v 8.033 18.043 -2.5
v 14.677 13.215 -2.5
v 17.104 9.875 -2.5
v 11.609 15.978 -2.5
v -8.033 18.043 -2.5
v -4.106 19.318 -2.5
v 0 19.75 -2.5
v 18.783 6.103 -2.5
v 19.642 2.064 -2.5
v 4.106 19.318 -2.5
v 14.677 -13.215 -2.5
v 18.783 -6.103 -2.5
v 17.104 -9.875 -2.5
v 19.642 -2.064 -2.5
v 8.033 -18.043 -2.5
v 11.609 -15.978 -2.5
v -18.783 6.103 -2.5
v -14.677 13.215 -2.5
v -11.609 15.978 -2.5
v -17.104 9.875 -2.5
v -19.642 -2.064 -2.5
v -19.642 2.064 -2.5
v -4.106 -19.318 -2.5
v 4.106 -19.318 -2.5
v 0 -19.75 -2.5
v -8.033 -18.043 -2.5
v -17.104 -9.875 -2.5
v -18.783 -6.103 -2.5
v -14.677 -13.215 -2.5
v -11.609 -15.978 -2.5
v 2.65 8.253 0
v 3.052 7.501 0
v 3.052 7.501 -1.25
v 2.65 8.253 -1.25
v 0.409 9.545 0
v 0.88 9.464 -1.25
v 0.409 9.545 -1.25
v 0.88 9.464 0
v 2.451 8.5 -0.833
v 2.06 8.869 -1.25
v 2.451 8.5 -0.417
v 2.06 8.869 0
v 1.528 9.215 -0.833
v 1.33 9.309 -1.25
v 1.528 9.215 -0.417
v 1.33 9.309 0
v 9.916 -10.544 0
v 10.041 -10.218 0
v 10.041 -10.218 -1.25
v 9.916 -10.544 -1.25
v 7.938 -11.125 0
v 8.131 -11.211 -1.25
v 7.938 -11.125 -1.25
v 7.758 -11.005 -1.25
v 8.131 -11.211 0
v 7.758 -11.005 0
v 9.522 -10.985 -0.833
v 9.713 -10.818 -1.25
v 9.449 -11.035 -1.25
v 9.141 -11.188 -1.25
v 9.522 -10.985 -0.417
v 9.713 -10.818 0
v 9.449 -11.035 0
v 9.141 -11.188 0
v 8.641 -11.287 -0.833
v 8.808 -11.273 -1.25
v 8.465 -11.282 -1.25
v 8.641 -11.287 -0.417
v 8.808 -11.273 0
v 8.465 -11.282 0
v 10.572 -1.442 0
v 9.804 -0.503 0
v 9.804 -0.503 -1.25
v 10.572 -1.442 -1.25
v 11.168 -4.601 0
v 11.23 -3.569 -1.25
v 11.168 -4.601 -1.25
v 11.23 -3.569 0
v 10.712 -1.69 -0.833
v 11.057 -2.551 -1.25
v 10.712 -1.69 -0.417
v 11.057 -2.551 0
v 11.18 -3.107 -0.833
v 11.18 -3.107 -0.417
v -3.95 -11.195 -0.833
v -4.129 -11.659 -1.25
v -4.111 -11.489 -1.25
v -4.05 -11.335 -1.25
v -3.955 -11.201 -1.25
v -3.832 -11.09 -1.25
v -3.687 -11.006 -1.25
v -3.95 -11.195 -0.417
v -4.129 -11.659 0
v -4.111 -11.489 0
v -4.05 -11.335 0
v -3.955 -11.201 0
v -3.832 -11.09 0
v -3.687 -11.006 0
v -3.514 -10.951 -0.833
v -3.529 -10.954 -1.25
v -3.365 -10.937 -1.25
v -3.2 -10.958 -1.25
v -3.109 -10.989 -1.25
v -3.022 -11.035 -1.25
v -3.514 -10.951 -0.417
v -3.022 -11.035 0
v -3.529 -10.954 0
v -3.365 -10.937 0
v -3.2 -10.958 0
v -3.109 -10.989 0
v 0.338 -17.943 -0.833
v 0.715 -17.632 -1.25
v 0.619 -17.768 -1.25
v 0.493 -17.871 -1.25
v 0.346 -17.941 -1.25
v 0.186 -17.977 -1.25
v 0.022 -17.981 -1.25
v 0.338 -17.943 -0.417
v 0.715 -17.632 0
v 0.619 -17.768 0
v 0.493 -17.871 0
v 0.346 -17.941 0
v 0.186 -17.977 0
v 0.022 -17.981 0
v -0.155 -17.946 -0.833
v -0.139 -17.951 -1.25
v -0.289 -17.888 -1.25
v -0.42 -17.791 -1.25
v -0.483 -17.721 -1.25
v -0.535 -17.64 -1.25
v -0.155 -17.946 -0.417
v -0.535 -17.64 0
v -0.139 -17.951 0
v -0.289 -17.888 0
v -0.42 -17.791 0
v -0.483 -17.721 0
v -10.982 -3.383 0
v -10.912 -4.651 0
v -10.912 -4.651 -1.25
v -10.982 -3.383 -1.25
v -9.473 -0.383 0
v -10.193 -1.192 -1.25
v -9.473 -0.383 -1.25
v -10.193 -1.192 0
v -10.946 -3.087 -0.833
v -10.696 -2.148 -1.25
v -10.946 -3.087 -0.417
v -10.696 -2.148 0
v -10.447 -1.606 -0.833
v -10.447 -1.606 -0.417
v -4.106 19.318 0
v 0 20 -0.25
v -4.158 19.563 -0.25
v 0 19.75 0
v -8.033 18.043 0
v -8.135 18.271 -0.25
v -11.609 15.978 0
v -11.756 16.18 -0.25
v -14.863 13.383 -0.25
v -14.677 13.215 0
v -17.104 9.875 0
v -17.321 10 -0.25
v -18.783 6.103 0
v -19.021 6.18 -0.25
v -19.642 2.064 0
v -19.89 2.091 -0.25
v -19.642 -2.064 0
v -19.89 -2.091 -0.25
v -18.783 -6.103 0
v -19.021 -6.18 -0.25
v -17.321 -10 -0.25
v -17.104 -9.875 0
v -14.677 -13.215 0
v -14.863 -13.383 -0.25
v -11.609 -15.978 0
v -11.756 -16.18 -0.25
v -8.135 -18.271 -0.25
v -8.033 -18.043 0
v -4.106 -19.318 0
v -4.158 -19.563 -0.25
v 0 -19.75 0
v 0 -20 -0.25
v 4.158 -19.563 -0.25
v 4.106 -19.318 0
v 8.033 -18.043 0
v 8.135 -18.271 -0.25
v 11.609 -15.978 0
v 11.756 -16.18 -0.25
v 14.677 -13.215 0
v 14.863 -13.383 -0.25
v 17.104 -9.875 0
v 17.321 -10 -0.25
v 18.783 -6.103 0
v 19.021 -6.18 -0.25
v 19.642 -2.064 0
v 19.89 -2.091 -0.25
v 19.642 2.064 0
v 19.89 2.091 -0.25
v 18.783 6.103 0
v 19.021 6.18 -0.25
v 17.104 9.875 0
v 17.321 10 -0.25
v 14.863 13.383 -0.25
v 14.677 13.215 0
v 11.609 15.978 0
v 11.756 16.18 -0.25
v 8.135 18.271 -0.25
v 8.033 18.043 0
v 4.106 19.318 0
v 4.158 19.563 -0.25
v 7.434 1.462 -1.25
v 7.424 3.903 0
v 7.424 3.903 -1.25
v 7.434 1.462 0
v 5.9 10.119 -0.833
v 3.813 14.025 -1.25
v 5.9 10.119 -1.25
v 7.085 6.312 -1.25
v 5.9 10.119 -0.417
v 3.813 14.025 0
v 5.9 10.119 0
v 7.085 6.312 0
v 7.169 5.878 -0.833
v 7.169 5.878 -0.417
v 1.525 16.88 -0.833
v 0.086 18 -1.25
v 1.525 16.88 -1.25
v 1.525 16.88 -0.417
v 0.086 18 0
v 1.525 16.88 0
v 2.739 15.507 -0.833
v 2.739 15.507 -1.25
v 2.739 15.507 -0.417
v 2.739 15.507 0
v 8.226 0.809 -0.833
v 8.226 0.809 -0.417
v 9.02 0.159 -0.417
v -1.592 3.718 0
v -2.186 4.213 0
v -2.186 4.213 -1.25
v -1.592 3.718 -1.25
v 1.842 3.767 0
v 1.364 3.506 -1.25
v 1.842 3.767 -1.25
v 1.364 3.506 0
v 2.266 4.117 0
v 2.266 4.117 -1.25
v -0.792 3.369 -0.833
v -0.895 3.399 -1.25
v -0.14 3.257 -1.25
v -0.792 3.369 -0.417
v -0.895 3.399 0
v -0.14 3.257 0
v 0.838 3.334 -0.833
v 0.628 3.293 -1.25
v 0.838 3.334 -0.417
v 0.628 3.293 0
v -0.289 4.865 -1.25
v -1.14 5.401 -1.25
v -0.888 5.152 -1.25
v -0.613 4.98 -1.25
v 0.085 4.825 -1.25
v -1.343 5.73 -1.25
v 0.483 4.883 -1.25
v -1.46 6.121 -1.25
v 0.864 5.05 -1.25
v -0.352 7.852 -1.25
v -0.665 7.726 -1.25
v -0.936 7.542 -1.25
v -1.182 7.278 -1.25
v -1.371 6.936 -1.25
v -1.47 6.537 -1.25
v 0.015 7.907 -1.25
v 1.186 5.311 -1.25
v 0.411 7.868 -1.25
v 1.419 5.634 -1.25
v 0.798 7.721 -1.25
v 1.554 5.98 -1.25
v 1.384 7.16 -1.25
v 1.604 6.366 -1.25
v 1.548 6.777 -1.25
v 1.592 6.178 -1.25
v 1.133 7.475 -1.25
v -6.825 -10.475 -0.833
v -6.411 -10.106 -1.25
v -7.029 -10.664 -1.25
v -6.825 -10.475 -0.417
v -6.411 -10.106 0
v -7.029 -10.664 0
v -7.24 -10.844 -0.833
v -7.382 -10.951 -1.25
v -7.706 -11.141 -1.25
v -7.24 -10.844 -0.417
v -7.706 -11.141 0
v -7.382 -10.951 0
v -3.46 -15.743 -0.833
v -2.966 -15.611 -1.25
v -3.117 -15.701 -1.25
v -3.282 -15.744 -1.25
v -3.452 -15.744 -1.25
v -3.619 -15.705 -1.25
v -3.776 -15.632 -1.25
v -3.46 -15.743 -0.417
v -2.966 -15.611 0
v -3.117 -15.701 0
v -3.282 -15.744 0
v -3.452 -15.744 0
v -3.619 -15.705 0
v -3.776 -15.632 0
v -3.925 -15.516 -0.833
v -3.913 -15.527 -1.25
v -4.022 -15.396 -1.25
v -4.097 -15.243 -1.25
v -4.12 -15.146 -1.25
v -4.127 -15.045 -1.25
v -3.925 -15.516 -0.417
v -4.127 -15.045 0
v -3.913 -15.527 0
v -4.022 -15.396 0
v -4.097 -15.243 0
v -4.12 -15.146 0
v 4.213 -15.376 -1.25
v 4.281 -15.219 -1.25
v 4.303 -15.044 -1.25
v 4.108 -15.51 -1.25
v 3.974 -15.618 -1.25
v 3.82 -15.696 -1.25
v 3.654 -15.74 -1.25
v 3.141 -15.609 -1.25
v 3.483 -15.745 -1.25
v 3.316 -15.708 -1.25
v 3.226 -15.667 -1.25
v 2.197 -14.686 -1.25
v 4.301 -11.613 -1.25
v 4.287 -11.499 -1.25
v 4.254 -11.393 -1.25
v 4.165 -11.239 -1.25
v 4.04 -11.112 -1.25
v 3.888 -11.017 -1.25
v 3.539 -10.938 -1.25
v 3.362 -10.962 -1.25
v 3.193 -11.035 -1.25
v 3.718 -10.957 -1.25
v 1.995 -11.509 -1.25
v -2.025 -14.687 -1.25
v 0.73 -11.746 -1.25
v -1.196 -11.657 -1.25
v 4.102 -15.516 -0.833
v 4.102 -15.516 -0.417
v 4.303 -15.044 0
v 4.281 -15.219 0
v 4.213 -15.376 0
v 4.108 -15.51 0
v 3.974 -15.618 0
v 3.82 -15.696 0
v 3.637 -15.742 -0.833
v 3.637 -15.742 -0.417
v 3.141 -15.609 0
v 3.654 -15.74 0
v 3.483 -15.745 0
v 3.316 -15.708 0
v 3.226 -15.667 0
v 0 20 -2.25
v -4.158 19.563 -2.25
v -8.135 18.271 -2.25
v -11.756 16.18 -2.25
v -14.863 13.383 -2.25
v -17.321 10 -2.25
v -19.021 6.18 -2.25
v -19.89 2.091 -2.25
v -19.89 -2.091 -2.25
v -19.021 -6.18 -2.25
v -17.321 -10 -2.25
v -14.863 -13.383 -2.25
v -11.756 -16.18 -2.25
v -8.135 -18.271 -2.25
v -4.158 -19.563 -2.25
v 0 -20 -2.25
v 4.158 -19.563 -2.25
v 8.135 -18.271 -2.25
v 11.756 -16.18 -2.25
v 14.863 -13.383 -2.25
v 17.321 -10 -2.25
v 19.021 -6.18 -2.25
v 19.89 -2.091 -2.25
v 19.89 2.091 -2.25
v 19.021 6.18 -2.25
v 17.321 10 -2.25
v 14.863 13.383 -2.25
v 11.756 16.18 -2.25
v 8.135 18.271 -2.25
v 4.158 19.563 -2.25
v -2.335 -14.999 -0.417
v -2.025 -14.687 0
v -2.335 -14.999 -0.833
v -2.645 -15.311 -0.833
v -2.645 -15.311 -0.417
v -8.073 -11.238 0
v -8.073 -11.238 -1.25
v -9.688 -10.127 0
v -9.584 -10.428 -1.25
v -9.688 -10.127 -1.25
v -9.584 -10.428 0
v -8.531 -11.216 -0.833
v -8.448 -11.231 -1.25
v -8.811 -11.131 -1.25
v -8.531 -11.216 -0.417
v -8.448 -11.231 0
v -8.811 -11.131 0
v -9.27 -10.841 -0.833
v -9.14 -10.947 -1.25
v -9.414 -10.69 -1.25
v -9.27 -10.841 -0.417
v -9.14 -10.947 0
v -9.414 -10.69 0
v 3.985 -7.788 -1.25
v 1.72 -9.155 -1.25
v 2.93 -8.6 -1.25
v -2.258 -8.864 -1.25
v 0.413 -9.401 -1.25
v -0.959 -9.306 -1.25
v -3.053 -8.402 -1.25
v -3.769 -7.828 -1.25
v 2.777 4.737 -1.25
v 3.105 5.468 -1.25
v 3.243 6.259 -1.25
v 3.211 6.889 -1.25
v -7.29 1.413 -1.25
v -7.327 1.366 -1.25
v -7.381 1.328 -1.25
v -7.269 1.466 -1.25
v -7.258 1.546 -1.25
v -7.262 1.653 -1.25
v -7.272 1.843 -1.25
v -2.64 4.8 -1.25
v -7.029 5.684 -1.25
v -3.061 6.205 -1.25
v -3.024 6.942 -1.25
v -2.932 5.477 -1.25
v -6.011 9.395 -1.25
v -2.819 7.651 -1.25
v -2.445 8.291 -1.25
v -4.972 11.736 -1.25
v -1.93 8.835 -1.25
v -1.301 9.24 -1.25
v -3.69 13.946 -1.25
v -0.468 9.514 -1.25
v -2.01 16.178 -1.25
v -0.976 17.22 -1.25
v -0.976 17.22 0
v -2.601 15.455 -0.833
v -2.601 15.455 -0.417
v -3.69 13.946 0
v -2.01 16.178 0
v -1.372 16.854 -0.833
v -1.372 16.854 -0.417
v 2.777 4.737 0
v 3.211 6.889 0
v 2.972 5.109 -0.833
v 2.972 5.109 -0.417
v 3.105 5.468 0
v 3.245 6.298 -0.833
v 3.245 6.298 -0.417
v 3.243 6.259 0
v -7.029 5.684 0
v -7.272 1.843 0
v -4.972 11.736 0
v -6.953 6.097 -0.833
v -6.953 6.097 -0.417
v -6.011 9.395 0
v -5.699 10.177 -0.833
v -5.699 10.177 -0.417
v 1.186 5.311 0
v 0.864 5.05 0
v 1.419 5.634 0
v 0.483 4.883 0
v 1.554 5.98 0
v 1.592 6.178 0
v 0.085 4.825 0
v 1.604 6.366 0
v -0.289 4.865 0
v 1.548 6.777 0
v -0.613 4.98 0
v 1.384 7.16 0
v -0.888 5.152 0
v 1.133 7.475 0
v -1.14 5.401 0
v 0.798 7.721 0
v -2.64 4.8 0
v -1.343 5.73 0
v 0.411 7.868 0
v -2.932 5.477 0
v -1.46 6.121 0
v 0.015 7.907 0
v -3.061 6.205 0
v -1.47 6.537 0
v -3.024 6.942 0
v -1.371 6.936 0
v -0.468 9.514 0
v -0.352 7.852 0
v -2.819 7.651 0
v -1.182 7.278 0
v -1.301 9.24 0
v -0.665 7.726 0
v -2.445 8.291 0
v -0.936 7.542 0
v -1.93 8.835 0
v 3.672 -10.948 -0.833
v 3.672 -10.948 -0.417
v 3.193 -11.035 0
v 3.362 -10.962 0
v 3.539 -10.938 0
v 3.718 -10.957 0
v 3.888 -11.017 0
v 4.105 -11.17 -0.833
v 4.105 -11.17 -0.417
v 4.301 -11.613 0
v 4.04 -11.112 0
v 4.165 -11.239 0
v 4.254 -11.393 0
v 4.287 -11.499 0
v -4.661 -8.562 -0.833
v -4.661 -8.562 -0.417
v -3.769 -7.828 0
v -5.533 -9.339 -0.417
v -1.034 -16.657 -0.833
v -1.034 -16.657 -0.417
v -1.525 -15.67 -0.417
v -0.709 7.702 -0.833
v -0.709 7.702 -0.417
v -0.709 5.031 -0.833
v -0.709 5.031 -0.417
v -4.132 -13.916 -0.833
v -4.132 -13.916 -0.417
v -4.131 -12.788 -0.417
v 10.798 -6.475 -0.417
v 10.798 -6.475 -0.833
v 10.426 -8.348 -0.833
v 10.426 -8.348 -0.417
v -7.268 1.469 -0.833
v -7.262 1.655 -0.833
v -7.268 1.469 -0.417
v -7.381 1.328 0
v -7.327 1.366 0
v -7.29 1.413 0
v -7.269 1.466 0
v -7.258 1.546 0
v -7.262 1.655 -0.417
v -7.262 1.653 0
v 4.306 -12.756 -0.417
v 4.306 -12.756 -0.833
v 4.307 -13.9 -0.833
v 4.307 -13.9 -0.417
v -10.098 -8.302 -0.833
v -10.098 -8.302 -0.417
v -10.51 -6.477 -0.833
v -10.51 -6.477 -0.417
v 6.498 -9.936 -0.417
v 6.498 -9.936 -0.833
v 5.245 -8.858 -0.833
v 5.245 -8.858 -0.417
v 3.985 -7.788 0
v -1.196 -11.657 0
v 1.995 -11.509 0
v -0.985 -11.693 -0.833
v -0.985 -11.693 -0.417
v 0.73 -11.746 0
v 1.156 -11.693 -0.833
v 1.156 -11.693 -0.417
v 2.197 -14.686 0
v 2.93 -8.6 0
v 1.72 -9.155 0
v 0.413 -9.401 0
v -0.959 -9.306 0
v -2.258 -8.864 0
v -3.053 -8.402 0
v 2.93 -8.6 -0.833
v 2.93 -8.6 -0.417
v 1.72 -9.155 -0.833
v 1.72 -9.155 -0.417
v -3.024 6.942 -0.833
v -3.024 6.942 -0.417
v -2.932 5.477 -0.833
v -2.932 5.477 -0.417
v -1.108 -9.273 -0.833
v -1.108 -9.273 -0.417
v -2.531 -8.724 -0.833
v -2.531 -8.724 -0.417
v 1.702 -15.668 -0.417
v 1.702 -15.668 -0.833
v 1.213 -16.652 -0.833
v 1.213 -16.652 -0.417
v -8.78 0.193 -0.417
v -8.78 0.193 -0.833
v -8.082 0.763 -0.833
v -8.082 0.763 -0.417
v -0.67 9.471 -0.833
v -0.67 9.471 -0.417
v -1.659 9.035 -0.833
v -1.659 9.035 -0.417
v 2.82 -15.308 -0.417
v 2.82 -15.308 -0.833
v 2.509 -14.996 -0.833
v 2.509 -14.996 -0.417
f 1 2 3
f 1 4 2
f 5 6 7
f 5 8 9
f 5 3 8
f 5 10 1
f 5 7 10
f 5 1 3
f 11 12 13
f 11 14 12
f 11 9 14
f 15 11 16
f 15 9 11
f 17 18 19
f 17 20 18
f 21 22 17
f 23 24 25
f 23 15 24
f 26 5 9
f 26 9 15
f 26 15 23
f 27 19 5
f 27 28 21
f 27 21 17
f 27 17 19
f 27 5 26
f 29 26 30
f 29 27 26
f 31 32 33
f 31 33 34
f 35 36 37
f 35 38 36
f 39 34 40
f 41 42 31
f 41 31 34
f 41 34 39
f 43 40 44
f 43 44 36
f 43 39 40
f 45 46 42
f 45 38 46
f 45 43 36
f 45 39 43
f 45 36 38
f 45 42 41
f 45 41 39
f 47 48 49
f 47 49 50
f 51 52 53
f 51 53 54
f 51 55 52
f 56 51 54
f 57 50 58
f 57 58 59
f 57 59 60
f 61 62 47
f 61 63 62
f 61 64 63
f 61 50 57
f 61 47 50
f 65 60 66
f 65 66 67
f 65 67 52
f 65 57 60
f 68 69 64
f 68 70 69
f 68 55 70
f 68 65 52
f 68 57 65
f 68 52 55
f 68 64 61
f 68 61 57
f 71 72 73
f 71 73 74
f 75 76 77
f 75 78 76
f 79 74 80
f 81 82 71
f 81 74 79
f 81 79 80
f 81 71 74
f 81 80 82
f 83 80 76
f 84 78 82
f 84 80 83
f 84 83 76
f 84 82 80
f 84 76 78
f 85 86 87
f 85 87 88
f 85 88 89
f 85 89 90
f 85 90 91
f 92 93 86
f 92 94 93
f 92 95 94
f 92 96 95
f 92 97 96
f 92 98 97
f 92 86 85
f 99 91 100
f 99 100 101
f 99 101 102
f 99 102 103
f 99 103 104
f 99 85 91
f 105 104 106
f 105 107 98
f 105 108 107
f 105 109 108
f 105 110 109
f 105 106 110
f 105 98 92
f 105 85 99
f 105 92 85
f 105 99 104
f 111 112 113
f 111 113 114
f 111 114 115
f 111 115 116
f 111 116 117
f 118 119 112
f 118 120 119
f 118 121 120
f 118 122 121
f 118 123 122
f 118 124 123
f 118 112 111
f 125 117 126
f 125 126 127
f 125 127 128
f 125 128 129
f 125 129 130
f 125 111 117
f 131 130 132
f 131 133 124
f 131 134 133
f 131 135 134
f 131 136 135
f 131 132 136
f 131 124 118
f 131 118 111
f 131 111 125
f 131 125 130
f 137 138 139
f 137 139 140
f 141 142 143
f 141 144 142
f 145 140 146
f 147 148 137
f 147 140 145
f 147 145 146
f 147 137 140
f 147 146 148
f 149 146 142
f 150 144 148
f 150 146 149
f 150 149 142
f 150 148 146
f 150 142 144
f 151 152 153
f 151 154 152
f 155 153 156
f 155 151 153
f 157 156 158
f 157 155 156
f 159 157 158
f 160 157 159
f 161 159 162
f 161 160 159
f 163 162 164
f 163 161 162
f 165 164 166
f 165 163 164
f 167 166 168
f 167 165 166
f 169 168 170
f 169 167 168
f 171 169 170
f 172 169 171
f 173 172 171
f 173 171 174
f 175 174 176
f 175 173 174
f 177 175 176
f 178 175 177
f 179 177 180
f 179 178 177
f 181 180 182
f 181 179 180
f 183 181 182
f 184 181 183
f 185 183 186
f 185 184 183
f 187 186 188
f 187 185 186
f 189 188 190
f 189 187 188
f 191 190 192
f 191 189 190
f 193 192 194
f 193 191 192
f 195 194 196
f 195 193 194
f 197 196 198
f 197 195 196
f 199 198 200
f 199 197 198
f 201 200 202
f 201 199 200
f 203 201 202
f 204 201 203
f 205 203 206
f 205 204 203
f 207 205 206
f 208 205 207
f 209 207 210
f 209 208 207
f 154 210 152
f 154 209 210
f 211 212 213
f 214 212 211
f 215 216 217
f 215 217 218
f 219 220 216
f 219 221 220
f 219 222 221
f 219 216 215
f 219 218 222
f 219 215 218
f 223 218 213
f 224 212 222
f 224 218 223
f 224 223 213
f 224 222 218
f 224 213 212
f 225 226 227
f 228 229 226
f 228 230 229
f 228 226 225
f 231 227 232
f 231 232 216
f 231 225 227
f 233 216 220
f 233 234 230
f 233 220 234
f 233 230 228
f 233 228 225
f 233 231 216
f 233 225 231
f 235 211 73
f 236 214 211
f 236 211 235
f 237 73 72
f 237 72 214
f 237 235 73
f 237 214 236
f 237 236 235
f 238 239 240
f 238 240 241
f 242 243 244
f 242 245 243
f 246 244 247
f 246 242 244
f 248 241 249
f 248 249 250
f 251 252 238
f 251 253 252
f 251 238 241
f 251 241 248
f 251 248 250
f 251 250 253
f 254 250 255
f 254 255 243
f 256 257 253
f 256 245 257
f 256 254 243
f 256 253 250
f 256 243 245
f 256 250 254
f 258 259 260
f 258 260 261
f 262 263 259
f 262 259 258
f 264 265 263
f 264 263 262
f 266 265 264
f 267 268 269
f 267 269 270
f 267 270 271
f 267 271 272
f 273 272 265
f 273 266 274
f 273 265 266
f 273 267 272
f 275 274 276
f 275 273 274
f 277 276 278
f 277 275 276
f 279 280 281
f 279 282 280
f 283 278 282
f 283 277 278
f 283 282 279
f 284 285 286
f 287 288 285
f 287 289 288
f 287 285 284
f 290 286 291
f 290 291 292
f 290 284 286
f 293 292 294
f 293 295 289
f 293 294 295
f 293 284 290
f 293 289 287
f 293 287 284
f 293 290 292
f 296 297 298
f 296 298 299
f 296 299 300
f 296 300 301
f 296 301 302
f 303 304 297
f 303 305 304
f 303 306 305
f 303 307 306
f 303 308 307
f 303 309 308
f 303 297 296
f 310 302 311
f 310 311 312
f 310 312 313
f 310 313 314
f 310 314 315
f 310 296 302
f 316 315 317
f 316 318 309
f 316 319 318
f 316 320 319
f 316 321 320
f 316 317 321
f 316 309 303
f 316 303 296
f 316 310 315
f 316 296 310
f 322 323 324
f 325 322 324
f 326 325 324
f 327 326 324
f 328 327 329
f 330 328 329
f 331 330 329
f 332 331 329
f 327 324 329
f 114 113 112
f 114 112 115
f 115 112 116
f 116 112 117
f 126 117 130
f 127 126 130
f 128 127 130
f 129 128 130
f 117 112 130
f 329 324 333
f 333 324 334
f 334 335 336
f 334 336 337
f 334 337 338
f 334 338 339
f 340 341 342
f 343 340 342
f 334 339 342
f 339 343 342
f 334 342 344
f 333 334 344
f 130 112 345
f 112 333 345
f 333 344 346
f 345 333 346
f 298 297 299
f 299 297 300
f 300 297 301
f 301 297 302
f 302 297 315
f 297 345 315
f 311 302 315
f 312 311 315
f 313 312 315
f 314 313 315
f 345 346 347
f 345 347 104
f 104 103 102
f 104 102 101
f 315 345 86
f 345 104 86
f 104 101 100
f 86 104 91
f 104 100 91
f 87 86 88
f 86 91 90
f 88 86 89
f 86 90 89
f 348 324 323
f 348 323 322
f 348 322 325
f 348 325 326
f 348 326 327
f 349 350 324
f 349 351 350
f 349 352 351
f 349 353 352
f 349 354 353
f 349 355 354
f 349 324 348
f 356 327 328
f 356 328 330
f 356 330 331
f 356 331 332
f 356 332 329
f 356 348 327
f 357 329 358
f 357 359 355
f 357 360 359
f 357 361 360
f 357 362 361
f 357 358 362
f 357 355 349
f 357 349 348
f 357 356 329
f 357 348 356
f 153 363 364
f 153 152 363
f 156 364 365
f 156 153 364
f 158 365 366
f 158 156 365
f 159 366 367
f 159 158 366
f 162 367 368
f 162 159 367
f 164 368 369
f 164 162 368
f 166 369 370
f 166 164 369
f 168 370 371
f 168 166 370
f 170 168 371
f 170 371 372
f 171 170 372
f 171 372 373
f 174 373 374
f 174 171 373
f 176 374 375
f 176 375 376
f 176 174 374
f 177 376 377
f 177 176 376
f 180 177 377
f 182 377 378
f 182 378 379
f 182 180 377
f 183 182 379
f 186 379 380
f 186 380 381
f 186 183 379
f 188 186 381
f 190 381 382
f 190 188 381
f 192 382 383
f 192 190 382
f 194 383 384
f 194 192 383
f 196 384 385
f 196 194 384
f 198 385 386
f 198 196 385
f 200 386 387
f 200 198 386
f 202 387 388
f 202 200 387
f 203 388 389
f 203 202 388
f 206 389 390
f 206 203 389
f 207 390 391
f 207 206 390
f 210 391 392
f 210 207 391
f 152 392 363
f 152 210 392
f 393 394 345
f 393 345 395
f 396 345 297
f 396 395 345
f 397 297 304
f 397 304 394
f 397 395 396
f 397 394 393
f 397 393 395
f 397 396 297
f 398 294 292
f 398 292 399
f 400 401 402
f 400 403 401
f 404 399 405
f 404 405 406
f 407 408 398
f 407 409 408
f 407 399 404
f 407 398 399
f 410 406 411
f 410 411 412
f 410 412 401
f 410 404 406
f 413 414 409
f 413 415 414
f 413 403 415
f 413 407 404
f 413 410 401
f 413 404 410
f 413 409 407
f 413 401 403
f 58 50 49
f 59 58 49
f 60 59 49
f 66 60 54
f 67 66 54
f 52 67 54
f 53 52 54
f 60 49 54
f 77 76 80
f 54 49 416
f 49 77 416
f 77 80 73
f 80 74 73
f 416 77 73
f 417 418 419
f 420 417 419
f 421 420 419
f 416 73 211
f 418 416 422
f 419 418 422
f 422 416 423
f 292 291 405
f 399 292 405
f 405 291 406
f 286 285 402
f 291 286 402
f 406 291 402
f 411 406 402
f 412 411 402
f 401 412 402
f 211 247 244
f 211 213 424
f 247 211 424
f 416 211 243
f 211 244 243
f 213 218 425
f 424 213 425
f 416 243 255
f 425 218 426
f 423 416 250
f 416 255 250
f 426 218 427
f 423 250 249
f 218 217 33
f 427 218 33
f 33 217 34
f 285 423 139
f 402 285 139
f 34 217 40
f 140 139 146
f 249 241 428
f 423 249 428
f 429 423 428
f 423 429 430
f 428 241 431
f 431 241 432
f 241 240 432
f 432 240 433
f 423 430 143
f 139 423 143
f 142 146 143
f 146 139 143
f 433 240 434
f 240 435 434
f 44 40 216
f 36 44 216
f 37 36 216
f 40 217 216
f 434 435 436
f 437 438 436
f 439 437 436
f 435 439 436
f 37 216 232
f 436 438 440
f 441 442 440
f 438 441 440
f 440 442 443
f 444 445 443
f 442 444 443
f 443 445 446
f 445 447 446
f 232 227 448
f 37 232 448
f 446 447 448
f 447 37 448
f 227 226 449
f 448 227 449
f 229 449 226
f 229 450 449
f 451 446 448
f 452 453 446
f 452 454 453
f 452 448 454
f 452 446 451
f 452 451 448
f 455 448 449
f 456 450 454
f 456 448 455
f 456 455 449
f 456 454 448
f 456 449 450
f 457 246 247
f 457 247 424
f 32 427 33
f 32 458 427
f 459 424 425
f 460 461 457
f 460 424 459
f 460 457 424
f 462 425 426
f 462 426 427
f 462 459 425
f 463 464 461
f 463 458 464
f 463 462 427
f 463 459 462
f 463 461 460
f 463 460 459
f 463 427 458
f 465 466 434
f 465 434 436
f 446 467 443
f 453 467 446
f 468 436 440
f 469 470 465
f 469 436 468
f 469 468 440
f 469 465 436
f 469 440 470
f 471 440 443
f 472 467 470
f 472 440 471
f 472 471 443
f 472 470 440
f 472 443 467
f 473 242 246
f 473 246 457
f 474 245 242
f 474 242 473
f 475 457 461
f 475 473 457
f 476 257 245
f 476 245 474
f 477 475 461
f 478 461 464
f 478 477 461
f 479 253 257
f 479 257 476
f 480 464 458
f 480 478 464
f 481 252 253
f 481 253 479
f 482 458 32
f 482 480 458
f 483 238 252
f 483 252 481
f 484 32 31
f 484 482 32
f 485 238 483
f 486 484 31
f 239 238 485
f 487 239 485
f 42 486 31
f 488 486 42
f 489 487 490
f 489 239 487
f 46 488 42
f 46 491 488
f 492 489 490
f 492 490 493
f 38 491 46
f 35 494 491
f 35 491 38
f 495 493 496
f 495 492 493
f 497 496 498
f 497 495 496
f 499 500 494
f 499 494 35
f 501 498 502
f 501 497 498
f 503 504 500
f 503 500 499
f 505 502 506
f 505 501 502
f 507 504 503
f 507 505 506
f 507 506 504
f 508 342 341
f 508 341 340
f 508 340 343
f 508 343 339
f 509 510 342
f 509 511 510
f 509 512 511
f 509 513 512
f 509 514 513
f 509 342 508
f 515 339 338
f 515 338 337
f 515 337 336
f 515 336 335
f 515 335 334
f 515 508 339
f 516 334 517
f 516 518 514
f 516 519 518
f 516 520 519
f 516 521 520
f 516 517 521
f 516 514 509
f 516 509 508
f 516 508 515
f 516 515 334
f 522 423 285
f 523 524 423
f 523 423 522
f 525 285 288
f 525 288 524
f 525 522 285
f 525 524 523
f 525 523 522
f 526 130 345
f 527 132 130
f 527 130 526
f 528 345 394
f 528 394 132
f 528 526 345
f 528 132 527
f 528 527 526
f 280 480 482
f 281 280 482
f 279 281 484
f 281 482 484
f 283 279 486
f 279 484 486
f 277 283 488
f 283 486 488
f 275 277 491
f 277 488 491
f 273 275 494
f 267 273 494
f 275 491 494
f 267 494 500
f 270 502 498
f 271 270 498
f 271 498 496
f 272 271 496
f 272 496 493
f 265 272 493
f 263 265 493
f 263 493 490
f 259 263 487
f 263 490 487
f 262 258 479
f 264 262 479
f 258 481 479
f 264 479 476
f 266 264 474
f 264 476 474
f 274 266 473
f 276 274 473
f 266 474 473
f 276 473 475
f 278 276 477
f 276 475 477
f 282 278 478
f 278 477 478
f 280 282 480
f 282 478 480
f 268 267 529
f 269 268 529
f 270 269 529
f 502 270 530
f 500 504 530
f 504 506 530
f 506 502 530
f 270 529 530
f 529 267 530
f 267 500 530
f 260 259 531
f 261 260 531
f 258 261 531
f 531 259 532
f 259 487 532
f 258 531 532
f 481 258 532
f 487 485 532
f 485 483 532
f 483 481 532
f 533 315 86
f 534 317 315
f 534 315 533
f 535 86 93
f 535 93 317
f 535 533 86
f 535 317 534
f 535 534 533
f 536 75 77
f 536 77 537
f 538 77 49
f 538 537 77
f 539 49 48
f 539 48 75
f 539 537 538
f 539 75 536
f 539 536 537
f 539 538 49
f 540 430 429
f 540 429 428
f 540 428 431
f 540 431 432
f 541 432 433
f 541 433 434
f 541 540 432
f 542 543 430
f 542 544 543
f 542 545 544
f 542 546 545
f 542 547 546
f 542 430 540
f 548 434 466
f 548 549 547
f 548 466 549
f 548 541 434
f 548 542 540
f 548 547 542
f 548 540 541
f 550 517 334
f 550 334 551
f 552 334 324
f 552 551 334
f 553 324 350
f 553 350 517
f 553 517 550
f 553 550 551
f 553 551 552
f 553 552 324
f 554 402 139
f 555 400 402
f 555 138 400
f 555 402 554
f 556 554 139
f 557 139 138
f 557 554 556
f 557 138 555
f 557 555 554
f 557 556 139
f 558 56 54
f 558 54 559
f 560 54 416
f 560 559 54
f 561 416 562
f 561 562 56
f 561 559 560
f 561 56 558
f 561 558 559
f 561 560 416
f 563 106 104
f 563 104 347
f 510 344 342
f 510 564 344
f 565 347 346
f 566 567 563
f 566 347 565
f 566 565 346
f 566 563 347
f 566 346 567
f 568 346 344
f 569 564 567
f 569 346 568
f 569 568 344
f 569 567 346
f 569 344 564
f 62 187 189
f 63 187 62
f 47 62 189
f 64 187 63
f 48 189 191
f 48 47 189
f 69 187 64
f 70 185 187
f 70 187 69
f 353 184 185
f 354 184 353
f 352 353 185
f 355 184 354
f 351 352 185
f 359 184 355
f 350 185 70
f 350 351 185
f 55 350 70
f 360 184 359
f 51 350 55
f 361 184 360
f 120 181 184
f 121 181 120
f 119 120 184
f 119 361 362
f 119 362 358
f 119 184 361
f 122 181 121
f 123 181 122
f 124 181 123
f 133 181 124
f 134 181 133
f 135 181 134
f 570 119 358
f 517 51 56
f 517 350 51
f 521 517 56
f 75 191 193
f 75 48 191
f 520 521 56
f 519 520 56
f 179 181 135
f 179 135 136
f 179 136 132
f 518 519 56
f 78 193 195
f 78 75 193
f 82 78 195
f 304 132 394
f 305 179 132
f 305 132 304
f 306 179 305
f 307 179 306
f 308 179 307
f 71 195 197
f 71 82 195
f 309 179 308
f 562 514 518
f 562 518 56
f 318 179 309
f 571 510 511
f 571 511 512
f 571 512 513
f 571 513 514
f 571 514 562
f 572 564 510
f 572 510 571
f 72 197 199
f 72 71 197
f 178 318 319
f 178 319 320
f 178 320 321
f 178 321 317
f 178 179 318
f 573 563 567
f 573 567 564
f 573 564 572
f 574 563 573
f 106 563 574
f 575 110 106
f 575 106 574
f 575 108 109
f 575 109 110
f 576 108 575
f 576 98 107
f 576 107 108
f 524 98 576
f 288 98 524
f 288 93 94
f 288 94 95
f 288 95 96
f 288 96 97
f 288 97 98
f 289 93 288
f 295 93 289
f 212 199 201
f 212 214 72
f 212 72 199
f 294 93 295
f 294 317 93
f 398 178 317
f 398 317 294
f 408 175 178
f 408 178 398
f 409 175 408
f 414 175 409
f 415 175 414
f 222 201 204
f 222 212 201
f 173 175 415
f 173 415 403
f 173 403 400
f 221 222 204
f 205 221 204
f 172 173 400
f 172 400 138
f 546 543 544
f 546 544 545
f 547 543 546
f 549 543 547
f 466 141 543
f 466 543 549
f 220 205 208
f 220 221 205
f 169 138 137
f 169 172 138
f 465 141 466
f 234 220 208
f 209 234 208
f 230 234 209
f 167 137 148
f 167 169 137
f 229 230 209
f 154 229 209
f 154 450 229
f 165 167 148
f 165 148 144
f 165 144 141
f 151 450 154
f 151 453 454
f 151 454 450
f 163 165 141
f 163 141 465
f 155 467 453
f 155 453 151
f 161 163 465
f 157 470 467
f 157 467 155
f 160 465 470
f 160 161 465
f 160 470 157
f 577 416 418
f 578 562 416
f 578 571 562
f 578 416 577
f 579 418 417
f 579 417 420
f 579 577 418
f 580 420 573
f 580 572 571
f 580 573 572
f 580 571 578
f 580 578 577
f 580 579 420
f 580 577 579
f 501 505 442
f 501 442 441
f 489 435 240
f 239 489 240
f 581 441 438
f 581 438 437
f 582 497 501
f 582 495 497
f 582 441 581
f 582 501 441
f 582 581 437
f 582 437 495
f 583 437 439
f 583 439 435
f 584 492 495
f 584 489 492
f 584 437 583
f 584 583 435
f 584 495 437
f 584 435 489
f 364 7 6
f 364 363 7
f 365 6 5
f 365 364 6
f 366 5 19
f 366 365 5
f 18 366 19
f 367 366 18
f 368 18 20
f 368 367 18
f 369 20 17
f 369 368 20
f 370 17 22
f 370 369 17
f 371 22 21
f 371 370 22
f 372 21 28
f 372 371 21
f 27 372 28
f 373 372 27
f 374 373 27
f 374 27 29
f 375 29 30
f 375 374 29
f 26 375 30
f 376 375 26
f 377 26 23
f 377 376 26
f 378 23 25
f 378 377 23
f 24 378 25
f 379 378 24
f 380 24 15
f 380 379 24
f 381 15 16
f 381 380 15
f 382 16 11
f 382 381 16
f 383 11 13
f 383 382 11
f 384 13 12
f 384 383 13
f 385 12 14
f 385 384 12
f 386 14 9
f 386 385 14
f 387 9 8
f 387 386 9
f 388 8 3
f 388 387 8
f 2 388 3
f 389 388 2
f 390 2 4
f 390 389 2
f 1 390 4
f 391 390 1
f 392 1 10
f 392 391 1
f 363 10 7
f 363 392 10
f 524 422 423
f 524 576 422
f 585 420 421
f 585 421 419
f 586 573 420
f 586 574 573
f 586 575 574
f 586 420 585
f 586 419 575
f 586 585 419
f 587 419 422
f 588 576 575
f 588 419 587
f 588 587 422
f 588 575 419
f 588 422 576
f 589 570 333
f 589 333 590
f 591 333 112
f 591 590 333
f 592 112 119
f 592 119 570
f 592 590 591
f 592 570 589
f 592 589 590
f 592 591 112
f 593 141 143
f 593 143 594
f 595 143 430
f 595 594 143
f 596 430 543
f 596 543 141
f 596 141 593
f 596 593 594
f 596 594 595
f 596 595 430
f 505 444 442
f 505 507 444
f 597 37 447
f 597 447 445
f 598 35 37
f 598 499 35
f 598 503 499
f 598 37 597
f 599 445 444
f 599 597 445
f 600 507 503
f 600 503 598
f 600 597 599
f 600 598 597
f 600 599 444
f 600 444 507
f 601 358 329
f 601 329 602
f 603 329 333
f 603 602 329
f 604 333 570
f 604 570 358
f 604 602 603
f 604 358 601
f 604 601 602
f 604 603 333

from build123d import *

# Parameters (mm, degrees)
POCKET_DEPTH = 1.25


with BuildPart() as part:
    # Sketch (on DatumPlane) → Revolution (revolve)
    with BuildSketch(Plane.YZ):
        Polygon((0, 0), (0, -2.5), (19.75, -2.5), (20, -2.25), (20, -0.25), (19.75, 0), align=None)
    revolve(axis=Axis((0, 0, 0), (0, 0, 1)))

    # Sketch005 → Pocket (cut)
    with BuildSketch(Plane.XY):
        with BuildLine():
            add(Edge.make_bspline(
                [(-3.689668, 13.94616), (-2.641611, 15.462794), (-1.516137, 17.02899), (0.085841, 18)],
                knots=[0, 0, 0, 0, 1, 1, 1, 1], degree=3))
            add(Edge.make_bspline(
                [(0.085841, 18), (1.66552, 17.053067), (2.779956, 15.514726), (3.813048, 14.024985)],
                knots=[0, 0, 0, 0, 1, 1, 1, 1], degree=3))
            add(Edge.make_bspline(
                [(3.813048, 14.024985), (6.246463, 10.339042), (7.734204, 5.911748), (7.434093, 1.462081)],
                knots=[0, 0, 0, 0, 1, 1, 1, 1], degree=3))
            add(Edge.make_bspline(
                [(7.434093, 1.462081), (8.220487, 0.802888), (9.029626, 0.169994), (9.804315, -0.502683)],
                knots=[0, 0, 0, 0, 1, 1, 1, 1], degree=3))
            add(Edge.make_bspline(
                [(9.804315, -0.502683), (10.91638, -1.524811), (11.43563, -3.119232), (11.167893, -4.601492)],
                knots=[0, 0, 0, 0, 1, 1, 1, 1], degree=3))
            add(Edge.make_bspline(
                [(11.167893, -4.601492), (10.794809, -6.473948), (10.436246, -8.350627), (10.041382, -10.217971)],
                knots=[0, 0, 0, 0, 1, 1, 1, 1], degree=3))
            add(Edge.make_bspline(
                [(10.041382, -10.217971), (9.821873, -11.178684), (8.522081, -11.618517), (7.757911, -11.004736)],
                knots=[0, 0, 0, 0, 1, 1, 1, 1], degree=3))
            add(Edge.make_bspline(
                [(7.757911, -11.004736), (6.48953, -9.946011), (5.252709, -8.848319), (3.984699, -7.78826)],
                knots=[0, 0, 0, 0, 1, 1, 1, 1], degree=3))
            add(Edge.make_bspline(
                [(3.984699, -7.78826), (3.02532, -8.711487), (1.750864, -9.327119), (0.412845, -9.401277)],
                knots=[0, 0, 0, 0, 1, 1, 1, 1], degree=3))
            add(Edge.make_bspline(
                [(0.412845, -9.401277), (-1.127422, -9.509883), (-2.652353, -8.871136), (-3.769011, -7.827598)],
                knots=[0, 0, 0, 0, 1, 1, 1, 1], degree=3))
            add(Edge.make_bspline(
                [(-3.769011, -7.827598), (-4.678754, -8.524056), (-5.522267, -9.360086), (-6.411119, -10.106031)],
                knots=[0, 0, 0, 0, 1, 1, 1, 1], degree=3))
            add(Edge.make_bspline(
                [(-6.411119, -10.106031), (-6.840728, -10.45126), (-7.197958, -10.904946), (-7.706392, -11.140679)],
                knots=[0, 0, 0, 0, 1, 1, 1, 1], degree=3))
            add(Edge.make_bspline(
                [(-7.706392, -11.140679), (-8.494639, -11.47887), (-9.509729, -10.97414), (-9.687899, -10.126849)],
                knots=[0, 0, 0, 0, 1, 1, 1, 1], degree=3))
            add(Edge.make_bspline(
                [(-9.687899, -10.126849), (-10.093802, -8.301287), (-10.517855, -6.478985), (-10.911756, -4.650609)],
                knots=[0, 0, 0, 0, 1, 1, 1, 1], degree=3))
            add(Edge.make_bspline(
                [(-10.911756, -4.650609), (-11.23187, -3.103897), (-10.66491, -1.419835), (-9.473131, -0.38289)],
                knots=[0, 0, 0, 0, 1, 1, 1, 1], degree=3))
            add(Edge.make_bspline(
                [(-9.473131, -0.38289), (-8.783193, 0.19659), (-8.083624, 0.764438), (-7.380796, 1.328138)],
                knots=[0, 0, 0, 0, 1, 1, 1, 1], degree=3))
            add(Edge.make_bspline(
                [(-7.380796, 1.328138), (-7.184994, 1.431114), (-7.283376, 1.668625), (-7.272264, 1.843092)],
                knots=[0, 0, 0, 0, 1, 1, 1, 1], degree=3))
            add(Edge.make_bspline(
                [(-7.272264, 1.843092), (-7.481771, 6.136295), (-6.015292, 10.379862), (-3.689668, 13.94616)],
                knots=[0, 0, 0, 0, 1, 1, 1, 1], degree=3))
        make_face()
        with BuildLine():
            add(Edge.make_bspline(
                [(-2.444846, 8.291231), (-3.365257, 7.106342), (-3.25391, 5.271002), (-2.186443, 4.212795)],
                knots=[0, 0, 0, 0, 1, 1, 1, 1], degree=3))
            add(Edge.make_bspline(
                [(-2.186443, 4.212795), (-1.056302, 2.967529), (1.084336, 2.922115), (2.26641, 4.117228)],
                knots=[0, 0, 0, 0, 1, 1, 1, 1], degree=3))
            add(Edge.make_bspline(
                [(2.26641, 4.117228), (3.178894, 4.950888), (3.487451, 6.350544), (3.051916, 7.500688)],
                knots=[0, 0, 0, 0, 1, 1, 1, 1], degree=3))
            add(Edge.make_bspline(
                [(3.051916, 7.500688), (2.652829, 8.609493), (1.584399, 9.441301), (0.409289, 9.544721)],
                knots=[0, 0, 0, 0, 1, 1, 1, 1], degree=3))
            add(Edge.make_bspline(
                [(0.409289, 9.544721), (-0.675884, 9.669626), (-1.799506, 9.170378), (-2.444846, 8.291231)],
                knots=[0, 0, 0, 0, 1, 1, 1, 1], degree=3))
        make_face(mode=Mode.SUBTRACT)
        with BuildLine():
            add(Edge.make_bspline(
                [(-4.128908, -11.658892), (-4.144688, -11.120603), (-3.474752, -10.750482), (-3.021955, -11.035333)],
                knots=[0, 0, 0, 0, 1, 1, 1, 1], degree=3))
            add(Edge.make_bspline(
                [(-3.021955, -11.035333), (-1.105419, -12.022123), (1.276879, -12.021678), (3.193341, -11.034814)],
                knots=[0, 0, 0, 0, 1, 1, 1, 1], degree=3))
            add(Edge.make_bspline(
                [(3.193341, -11.034814), (3.633173, -10.76478), (4.285033, -11.089117), (4.301257, -11.612886)],
                knots=[0, 0, 0, 0, 1, 1, 1, 1], degree=3))
            add(Edge.make_bspline(
                [(4.301257, -11.612886), (4.307702, -12.75614), (4.309036, -13.90058), (4.303035, -15.044204)],
                knots=[0, 0, 0, 0, 1, 1, 1, 1], degree=3))
            add(Edge.make_bspline(
                [(4.303035, -15.044204), (4.311851, -15.602274), (3.574648, -15.95817), (3.141334, -15.609164)],
                knots=[0, 0, 0, 0, 1, 1, 1, 1], degree=3))
            add(Edge.make_bspline(
                [(3.141334, -15.609164), (2.811515, -15.318312), (2.514071, -14.991235), (2.196772, -14.686011)],
                knots=[0, 0, 0, 0, 1, 1, 1, 1], degree=3))
            add(Edge.make_bspline(
                [(2.196772, -14.686011), (1.694783, -15.663985), (1.221613, -16.656776), (0.715475, -17.632454)],
                knots=[0, 0, 0, 0, 1, 1, 1, 1], degree=3))
            add(Edge.make_bspline(
                [(0.715475, -17.632454), (0.472408, -18.097326), (-0.287094, -18.100512), (-0.534829, -17.640232)],
                knots=[0, 0, 0, 0, 1, 1, 1, 1], degree=3))
            add(Edge.make_bspline(
                [(-0.534829, -17.640232), (-1.043782, -16.662703), (-1.513692, -15.663985), (-2.02546, -14.687419)],
                knots=[0, 0, 0, 0, 1, 1, 1, 1], degree=3))
            add(Edge.make_bspline(
                [(-2.02546, -14.687419), (-2.338166, -14.995383), (-2.636499, -15.320683), (-2.965874, -15.61109)],
                knots=[0, 0, 0, 0, 1, 1, 1, 1], degree=3))
            add(Edge.make_bspline(
                [(-2.965874, -15.61109), (-3.397335, -15.9618), (-4.133131, -15.599088), (-4.12713, -15.044575)],
                knots=[0, 0, 0, 0, 1, 1, 1, 1], degree=3))
            add(Edge.make_bspline(
                [(-4.12713, -15.044575), (-4.136316, -13.916359), (-4.130315, -12.787626), (-4.128908, -11.658892)],
                knots=[0, 0, 0, 0, 1, 1, 1, 1], degree=3))
        make_face()
        with BuildLine():
            add(Edge.make_bspline(
                [(1.60366, 6.366324), (1.60366, 9.036838), (-0.709074, 7.701581), (-3.021807, 6.366324), (-0.709074, 5.031066), (1.60366, 3.695809), (1.60366, 6.366324)],
                knots=[0, 0, 0, 2.094395, 2.094395, 4.18879, 4.18879, 6.283185, 6.283185, 6.283185], degree=2, weights=[1, 0.5, 1, 0.5, 1, 0.5, 1]))
        make_face()
    extrude(amount=-POCKET_DEPTH, mode=Mode.SUBTRACT)


solid = part.part
